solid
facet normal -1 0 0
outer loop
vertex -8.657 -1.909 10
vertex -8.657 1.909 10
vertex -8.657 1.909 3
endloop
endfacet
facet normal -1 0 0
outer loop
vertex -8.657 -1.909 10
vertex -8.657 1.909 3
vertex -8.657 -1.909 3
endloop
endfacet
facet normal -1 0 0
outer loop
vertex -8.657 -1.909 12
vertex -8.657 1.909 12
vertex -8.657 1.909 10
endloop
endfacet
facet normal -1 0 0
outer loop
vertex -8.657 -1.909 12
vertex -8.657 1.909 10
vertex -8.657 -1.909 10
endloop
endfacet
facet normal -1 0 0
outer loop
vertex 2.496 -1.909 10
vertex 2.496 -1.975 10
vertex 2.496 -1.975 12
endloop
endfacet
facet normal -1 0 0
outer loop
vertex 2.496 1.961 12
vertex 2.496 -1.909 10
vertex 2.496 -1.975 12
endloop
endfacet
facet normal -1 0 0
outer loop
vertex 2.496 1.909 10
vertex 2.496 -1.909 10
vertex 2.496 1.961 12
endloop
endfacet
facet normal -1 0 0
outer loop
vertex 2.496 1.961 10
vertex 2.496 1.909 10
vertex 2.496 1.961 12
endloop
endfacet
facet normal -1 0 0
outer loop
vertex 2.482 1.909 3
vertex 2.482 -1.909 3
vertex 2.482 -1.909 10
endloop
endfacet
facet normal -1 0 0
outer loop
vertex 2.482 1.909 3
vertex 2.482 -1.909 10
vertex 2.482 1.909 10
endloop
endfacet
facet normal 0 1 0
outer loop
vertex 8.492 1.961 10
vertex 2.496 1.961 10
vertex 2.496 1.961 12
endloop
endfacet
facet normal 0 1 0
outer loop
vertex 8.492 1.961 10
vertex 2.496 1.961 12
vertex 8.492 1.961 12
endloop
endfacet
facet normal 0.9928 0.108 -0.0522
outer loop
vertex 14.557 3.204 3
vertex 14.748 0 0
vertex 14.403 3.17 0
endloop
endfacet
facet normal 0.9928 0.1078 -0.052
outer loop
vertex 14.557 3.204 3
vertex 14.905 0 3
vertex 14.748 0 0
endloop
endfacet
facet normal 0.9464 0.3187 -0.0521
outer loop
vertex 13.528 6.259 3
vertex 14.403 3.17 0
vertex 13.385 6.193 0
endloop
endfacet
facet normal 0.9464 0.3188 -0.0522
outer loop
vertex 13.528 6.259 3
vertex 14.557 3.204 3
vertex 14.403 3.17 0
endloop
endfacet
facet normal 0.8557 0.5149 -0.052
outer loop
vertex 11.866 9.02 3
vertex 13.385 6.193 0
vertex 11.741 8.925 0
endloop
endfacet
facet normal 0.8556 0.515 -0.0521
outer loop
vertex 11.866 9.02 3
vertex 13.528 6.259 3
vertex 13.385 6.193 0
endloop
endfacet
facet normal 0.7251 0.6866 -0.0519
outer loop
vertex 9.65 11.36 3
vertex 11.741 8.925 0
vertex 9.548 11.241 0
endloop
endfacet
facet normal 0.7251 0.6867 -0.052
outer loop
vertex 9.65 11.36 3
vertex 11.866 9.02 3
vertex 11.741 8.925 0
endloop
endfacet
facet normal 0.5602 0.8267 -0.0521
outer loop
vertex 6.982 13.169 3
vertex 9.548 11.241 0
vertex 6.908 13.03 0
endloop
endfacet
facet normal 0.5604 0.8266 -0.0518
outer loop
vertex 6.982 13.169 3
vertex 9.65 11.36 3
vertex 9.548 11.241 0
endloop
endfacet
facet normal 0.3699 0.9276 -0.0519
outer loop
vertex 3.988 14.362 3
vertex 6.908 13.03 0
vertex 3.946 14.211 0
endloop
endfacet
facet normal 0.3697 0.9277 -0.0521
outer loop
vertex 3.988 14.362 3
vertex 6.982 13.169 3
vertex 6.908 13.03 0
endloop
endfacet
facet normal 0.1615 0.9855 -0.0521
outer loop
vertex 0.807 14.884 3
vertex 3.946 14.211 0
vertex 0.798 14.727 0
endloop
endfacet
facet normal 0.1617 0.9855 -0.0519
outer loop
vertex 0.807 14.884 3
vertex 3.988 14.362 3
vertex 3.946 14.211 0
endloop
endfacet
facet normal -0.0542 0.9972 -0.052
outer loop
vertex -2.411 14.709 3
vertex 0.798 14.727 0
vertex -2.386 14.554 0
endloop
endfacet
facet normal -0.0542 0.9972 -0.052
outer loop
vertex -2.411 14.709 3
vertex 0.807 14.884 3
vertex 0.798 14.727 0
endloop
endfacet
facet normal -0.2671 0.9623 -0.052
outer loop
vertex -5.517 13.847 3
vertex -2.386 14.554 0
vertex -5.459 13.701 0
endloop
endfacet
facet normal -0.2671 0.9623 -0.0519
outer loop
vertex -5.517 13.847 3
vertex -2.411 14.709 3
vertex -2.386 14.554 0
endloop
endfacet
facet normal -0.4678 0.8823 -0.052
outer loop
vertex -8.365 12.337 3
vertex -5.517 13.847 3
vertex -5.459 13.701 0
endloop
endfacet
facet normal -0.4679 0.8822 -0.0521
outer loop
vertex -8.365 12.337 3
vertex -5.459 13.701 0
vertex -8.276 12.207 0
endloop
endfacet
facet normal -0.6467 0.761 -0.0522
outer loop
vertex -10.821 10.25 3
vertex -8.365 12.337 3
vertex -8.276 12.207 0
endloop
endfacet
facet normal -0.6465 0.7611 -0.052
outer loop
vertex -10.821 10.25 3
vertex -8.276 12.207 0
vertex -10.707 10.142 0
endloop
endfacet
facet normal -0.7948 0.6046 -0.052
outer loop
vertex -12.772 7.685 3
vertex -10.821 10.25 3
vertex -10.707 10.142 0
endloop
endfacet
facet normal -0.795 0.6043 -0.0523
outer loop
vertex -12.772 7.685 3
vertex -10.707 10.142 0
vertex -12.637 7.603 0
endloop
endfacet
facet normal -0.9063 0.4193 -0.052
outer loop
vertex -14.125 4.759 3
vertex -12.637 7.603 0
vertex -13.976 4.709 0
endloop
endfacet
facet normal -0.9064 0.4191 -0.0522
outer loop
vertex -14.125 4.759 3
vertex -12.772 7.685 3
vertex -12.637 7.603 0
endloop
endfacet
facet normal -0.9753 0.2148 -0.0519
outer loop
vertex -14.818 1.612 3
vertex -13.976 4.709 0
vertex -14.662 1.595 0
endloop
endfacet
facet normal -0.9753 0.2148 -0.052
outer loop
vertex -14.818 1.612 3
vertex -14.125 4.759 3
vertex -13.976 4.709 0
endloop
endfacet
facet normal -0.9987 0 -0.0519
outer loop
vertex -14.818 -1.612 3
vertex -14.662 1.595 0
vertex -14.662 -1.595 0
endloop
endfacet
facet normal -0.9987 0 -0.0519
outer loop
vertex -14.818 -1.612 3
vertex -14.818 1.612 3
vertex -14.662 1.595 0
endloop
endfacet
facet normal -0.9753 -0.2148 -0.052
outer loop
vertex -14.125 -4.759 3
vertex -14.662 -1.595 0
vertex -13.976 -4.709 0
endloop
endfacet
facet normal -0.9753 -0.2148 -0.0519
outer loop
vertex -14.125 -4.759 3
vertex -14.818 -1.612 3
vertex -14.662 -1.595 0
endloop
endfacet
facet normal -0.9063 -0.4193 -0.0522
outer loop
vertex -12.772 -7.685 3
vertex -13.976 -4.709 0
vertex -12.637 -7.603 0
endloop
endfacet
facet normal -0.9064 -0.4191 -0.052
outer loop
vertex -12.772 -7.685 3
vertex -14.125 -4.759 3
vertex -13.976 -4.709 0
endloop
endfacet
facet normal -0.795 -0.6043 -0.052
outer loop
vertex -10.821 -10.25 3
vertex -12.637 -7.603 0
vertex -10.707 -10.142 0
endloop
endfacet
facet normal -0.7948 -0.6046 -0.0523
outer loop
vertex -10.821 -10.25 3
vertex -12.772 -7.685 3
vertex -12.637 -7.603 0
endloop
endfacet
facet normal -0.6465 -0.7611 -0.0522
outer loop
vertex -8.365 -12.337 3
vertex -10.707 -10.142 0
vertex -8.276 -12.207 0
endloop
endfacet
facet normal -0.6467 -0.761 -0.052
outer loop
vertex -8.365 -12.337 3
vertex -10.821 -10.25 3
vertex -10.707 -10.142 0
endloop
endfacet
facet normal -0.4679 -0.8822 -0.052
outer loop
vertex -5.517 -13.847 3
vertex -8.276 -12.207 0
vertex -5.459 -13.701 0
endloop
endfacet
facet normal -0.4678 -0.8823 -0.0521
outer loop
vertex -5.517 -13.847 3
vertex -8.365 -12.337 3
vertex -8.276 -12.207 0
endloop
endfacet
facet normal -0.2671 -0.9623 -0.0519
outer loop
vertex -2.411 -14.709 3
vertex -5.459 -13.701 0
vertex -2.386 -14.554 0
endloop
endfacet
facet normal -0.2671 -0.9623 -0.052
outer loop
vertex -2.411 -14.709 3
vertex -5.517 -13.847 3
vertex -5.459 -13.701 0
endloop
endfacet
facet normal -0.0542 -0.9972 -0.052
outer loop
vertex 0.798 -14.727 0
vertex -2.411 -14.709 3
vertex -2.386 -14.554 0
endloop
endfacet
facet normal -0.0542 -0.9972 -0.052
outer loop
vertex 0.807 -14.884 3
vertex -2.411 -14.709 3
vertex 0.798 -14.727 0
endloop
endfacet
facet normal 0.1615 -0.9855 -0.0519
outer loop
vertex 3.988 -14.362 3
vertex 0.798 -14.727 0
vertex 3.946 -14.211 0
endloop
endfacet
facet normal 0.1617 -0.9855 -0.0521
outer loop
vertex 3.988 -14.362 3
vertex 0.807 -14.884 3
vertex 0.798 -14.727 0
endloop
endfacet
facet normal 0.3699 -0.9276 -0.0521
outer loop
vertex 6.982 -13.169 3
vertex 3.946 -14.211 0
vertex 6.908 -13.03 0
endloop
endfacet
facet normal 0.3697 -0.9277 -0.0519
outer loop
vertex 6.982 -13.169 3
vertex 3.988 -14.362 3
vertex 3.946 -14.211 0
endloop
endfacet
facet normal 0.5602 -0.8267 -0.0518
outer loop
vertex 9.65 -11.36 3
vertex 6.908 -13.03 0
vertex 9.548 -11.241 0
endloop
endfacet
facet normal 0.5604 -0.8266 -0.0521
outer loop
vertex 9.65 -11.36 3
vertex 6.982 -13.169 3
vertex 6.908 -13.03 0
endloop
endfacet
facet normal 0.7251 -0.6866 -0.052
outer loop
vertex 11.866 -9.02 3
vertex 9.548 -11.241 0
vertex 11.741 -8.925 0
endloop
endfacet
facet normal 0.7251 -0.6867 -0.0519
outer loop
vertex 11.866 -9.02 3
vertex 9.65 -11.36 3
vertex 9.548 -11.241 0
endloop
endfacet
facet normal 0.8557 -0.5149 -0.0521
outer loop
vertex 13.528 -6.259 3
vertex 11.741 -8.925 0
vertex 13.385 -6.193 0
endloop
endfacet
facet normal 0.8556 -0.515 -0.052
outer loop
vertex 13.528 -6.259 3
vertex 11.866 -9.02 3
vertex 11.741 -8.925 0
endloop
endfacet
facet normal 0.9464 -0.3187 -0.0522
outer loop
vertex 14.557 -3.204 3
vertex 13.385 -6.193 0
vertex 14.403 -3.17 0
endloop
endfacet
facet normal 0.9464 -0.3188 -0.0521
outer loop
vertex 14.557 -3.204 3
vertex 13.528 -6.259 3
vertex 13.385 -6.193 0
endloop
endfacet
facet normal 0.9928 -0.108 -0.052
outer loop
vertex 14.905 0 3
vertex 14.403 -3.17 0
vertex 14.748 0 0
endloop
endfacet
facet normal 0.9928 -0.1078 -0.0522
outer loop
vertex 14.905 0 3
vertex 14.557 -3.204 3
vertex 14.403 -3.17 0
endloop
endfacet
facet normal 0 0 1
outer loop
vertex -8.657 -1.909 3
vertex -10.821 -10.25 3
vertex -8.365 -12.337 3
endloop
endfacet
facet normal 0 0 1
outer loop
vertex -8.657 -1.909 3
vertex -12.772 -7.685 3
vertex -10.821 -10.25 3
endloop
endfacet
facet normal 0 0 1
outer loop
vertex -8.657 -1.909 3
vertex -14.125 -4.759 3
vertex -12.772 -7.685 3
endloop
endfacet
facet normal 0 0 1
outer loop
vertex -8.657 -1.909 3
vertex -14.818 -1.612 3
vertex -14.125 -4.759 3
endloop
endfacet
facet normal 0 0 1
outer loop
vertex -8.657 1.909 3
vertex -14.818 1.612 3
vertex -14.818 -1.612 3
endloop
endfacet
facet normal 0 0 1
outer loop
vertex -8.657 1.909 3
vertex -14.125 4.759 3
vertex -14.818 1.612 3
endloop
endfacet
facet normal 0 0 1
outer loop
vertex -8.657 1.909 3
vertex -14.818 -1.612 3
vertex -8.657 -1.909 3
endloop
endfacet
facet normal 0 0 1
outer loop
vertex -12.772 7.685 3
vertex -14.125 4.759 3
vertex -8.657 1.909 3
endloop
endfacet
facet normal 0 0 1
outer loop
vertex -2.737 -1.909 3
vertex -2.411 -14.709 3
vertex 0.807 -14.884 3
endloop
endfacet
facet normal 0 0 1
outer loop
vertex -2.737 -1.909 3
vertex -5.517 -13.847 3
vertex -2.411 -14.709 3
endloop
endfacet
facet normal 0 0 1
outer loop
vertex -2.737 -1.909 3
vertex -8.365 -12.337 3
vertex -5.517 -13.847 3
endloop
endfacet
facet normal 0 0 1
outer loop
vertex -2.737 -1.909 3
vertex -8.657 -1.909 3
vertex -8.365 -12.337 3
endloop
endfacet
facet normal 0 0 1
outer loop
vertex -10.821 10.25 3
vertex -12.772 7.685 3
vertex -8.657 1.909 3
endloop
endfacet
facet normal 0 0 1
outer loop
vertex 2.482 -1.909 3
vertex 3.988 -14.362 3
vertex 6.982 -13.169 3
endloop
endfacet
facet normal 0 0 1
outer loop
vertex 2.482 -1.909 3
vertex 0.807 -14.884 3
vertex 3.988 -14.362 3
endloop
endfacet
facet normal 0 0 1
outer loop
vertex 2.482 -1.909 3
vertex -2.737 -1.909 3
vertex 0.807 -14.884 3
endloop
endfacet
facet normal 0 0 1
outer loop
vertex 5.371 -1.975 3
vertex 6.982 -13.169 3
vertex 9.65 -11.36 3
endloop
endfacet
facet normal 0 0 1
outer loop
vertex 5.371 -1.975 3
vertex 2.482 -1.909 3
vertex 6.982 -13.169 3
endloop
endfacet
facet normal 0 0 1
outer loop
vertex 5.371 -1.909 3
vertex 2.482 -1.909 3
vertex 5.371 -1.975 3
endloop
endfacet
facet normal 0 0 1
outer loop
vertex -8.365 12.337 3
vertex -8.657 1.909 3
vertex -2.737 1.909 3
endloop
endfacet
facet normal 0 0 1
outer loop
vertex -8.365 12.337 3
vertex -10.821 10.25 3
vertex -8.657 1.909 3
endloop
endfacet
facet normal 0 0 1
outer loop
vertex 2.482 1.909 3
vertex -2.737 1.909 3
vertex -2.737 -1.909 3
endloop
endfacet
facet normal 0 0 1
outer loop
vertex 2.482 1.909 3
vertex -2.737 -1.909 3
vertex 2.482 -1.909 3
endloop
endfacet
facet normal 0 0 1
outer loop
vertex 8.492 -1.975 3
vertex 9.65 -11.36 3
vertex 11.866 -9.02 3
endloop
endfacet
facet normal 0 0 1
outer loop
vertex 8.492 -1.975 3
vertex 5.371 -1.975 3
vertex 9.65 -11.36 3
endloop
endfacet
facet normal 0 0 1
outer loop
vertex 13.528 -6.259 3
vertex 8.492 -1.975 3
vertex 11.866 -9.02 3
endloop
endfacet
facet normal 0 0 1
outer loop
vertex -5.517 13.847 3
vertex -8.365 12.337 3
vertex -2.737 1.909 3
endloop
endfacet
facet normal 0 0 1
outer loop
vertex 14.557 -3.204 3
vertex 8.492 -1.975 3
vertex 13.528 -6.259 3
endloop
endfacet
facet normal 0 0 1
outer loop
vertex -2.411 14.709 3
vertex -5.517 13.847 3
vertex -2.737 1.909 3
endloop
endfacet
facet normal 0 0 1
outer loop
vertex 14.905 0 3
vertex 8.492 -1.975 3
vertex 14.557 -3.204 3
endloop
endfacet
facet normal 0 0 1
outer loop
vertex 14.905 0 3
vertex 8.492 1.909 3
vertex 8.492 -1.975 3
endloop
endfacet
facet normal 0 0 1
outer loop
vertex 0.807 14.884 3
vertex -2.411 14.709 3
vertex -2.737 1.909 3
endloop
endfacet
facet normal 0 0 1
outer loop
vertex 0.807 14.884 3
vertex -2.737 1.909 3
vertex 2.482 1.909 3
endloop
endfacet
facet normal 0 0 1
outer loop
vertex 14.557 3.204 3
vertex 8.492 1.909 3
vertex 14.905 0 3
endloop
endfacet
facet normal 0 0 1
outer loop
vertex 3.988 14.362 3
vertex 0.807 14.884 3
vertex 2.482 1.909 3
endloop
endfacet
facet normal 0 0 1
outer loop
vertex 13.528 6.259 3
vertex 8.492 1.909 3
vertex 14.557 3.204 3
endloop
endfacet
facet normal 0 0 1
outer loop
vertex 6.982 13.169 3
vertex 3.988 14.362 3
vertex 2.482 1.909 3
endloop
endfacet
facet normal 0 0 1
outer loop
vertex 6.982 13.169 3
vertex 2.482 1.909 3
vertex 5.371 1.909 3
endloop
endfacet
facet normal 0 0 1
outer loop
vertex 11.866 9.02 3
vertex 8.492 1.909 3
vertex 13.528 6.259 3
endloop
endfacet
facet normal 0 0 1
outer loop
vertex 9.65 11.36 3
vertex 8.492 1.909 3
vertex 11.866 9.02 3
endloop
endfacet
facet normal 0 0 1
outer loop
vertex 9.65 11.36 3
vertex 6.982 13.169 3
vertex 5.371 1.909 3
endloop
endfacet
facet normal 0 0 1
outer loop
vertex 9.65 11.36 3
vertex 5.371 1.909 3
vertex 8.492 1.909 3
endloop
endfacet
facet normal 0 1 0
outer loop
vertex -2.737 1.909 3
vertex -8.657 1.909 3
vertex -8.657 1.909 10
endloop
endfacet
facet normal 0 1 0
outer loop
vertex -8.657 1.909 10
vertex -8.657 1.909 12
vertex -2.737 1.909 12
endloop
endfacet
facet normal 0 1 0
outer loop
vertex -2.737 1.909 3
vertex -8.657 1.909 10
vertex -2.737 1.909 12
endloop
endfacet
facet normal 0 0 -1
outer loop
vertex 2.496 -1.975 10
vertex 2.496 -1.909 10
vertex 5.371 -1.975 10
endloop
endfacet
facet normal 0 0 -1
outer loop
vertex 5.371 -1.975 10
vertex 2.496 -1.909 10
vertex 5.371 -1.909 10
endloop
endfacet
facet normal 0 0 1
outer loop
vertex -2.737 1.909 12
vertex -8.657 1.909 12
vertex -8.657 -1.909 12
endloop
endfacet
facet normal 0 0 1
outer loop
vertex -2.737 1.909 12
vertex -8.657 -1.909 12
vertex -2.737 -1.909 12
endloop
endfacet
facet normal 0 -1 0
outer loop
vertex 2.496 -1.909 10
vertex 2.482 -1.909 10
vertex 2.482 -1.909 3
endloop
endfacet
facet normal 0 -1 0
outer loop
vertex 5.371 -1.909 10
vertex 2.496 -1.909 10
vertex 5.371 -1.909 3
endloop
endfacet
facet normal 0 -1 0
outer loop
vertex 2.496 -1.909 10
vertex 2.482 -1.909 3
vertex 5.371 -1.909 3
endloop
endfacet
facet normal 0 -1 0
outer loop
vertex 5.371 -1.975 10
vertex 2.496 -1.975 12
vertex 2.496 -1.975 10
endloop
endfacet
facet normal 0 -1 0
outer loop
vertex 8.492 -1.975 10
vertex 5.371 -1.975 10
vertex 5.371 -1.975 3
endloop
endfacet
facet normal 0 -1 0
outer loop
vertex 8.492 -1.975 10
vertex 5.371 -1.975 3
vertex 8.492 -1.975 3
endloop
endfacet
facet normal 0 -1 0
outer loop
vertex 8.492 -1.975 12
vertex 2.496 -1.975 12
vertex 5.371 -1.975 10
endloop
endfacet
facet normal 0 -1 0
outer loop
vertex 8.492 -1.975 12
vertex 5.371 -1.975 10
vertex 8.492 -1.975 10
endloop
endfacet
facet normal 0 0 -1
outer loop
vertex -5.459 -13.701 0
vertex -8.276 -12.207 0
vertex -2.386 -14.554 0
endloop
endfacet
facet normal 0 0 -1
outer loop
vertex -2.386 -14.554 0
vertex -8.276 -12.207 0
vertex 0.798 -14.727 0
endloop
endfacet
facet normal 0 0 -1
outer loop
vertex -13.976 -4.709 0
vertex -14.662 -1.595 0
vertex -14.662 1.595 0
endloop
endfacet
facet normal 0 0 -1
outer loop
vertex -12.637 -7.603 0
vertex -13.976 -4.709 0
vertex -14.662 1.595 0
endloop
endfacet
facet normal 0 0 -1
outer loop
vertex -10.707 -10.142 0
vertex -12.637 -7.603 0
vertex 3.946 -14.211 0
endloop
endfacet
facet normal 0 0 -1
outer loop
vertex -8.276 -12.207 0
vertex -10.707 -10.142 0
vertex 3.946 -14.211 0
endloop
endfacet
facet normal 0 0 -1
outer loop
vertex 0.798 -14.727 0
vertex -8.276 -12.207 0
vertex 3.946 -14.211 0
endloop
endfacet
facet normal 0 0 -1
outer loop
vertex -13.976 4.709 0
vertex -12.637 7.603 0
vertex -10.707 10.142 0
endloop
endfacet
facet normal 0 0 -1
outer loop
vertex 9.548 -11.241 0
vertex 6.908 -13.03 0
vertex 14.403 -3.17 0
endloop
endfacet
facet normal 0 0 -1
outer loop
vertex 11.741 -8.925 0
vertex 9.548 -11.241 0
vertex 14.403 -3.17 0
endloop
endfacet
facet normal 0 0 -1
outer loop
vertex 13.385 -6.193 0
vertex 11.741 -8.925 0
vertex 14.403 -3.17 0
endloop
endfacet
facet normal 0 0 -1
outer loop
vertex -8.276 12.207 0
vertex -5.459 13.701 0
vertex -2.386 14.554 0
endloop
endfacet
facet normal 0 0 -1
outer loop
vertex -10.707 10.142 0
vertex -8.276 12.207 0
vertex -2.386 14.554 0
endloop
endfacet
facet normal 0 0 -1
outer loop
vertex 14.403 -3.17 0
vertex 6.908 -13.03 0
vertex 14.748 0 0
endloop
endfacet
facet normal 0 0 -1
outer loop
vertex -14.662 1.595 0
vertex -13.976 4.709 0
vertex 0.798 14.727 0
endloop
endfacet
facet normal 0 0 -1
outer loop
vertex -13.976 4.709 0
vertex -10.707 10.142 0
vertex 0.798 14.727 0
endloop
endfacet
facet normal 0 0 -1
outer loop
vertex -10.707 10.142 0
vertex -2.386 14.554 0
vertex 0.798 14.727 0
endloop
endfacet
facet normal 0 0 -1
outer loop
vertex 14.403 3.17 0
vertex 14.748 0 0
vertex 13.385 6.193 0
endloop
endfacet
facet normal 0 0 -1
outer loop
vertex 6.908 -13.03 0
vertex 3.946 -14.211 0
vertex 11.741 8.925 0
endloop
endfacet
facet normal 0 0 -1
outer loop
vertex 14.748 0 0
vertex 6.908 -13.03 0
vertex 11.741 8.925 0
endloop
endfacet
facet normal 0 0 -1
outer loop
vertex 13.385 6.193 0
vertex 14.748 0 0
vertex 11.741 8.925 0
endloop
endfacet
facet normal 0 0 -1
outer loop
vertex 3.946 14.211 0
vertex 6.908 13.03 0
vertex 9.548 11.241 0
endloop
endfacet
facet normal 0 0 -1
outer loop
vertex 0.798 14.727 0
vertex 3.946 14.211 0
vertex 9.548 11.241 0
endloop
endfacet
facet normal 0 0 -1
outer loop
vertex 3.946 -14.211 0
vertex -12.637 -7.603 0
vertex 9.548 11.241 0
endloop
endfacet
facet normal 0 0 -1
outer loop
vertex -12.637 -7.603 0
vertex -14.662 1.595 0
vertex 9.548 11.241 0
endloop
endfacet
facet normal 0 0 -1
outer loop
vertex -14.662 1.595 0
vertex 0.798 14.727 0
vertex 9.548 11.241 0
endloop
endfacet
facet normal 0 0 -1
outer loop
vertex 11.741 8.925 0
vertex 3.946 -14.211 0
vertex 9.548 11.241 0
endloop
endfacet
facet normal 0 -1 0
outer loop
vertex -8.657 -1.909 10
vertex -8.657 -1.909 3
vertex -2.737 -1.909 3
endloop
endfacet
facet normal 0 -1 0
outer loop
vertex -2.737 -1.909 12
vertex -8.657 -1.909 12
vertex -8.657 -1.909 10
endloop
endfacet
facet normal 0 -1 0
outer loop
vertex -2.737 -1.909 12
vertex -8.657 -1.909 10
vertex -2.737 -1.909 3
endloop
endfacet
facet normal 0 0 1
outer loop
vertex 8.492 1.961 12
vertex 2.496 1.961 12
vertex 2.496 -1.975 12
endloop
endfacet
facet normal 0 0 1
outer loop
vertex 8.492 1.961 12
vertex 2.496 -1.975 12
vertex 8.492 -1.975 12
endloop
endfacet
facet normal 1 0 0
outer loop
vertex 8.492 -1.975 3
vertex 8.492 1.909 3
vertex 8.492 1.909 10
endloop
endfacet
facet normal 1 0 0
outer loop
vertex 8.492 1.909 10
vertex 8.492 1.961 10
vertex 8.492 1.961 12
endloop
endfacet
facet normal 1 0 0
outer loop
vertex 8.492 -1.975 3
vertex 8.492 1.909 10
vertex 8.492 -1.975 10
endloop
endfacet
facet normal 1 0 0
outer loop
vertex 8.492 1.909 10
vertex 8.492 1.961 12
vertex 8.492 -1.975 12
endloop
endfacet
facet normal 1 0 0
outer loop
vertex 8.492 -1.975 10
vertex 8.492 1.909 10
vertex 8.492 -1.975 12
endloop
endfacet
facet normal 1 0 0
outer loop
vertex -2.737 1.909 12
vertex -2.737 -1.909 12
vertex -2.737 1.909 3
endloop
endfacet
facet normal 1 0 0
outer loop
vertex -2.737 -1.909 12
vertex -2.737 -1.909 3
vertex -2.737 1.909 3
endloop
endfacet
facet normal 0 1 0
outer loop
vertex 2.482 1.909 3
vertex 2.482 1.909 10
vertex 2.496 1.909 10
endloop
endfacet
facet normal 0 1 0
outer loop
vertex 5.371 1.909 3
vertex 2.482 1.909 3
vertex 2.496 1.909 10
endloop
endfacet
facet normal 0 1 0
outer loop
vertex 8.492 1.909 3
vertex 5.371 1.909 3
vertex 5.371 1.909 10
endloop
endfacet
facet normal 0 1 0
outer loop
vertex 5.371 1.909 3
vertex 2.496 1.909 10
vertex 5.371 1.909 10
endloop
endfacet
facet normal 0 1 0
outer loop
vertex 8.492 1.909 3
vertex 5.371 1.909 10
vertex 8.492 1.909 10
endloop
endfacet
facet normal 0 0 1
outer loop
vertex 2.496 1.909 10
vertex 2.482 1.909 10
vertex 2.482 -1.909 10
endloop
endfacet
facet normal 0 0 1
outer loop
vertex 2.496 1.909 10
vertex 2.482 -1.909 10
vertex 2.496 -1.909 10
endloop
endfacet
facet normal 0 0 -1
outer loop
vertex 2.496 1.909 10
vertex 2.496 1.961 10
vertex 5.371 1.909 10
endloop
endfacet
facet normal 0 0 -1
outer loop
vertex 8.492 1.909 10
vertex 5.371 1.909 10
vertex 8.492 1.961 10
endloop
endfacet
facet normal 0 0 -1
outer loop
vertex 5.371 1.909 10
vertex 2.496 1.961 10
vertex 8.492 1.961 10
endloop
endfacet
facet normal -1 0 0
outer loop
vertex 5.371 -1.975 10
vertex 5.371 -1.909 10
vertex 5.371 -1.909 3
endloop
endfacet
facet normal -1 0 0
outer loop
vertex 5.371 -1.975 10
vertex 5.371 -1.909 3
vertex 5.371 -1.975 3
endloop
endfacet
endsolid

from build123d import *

# Parameters (mm, degrees)
F0_R     = 14.7481793899
F1_DEPTH = 3
F1_TAPER = -3
F2_W     = 2.8173960745
F2_H     = 3.8187131286
F2_W_2   = 2.8887987137
F3_DEPTH = 7
F4_W     = 5.9206429869
F4_H     = 3.8187131286
F4_W_2   = 5.9958791826
F4_H_2   = 3.9352546446
F5_DEPTH = 2
F6_W     = 3.1207427382
F6_H     = 3.8840055931
F7_DEPTH = 7
F8_W     = 3.1032469124
F8_H     = 3.8187131286
F9_DEPTH = 7


with BuildPart() as f1:
    # F0 (on Top) → F1 (new body)
    with BuildSketch(Plane.XY):
        Circle(F0_R)
    extrude(amount=F1_DEPTH, taper=F1_TAPER)

    # F2 (on face) → F3 (join)
    with BuildSketch(Plane.XY.offset(3)):
        with Locations((-4.1453484446, 0)):
            Rectangle(F2_W, F2_H)
        with Locations((3.9267931134, 0)):
            Rectangle(F2_W_2, F2_H)
    extrude(amount=F3_DEPTH)

    # F4 (on face) → F5 (join)
    with BuildSketch(Plane.XY.offset(10)):
        with Locations((-5.6969719008, 0)):
            Rectangle(F4_W, F4_H)
        with Locations((5.4939956171, -0.0070217066)):
            Rectangle(F4_W_2, F4_H_2)
    extrude(amount=F5_DEPTH)

    # F6 (on face) → F7 (join)
    with BuildSketch(Plane(origin=(0, 0, 10), x_dir=(1, 0, 0), z_dir=(0, 0, -1))):
        with Locations((6.9315638393, 0.0326462323)):
            Rectangle(F6_W, F6_H)
    extrude(amount=F7_DEPTH)

    # F8 (on face) → F9 (join)
    with BuildSketch(Plane(origin=(0, 0, 10), x_dir=(1, 0, 0), z_dir=(0, 0, -1))):
        with Locations((-7.105669938, 0)):
            Rectangle(F8_W, F8_H)
    extrude(amount=F9_DEPTH)


solid = f1.part
